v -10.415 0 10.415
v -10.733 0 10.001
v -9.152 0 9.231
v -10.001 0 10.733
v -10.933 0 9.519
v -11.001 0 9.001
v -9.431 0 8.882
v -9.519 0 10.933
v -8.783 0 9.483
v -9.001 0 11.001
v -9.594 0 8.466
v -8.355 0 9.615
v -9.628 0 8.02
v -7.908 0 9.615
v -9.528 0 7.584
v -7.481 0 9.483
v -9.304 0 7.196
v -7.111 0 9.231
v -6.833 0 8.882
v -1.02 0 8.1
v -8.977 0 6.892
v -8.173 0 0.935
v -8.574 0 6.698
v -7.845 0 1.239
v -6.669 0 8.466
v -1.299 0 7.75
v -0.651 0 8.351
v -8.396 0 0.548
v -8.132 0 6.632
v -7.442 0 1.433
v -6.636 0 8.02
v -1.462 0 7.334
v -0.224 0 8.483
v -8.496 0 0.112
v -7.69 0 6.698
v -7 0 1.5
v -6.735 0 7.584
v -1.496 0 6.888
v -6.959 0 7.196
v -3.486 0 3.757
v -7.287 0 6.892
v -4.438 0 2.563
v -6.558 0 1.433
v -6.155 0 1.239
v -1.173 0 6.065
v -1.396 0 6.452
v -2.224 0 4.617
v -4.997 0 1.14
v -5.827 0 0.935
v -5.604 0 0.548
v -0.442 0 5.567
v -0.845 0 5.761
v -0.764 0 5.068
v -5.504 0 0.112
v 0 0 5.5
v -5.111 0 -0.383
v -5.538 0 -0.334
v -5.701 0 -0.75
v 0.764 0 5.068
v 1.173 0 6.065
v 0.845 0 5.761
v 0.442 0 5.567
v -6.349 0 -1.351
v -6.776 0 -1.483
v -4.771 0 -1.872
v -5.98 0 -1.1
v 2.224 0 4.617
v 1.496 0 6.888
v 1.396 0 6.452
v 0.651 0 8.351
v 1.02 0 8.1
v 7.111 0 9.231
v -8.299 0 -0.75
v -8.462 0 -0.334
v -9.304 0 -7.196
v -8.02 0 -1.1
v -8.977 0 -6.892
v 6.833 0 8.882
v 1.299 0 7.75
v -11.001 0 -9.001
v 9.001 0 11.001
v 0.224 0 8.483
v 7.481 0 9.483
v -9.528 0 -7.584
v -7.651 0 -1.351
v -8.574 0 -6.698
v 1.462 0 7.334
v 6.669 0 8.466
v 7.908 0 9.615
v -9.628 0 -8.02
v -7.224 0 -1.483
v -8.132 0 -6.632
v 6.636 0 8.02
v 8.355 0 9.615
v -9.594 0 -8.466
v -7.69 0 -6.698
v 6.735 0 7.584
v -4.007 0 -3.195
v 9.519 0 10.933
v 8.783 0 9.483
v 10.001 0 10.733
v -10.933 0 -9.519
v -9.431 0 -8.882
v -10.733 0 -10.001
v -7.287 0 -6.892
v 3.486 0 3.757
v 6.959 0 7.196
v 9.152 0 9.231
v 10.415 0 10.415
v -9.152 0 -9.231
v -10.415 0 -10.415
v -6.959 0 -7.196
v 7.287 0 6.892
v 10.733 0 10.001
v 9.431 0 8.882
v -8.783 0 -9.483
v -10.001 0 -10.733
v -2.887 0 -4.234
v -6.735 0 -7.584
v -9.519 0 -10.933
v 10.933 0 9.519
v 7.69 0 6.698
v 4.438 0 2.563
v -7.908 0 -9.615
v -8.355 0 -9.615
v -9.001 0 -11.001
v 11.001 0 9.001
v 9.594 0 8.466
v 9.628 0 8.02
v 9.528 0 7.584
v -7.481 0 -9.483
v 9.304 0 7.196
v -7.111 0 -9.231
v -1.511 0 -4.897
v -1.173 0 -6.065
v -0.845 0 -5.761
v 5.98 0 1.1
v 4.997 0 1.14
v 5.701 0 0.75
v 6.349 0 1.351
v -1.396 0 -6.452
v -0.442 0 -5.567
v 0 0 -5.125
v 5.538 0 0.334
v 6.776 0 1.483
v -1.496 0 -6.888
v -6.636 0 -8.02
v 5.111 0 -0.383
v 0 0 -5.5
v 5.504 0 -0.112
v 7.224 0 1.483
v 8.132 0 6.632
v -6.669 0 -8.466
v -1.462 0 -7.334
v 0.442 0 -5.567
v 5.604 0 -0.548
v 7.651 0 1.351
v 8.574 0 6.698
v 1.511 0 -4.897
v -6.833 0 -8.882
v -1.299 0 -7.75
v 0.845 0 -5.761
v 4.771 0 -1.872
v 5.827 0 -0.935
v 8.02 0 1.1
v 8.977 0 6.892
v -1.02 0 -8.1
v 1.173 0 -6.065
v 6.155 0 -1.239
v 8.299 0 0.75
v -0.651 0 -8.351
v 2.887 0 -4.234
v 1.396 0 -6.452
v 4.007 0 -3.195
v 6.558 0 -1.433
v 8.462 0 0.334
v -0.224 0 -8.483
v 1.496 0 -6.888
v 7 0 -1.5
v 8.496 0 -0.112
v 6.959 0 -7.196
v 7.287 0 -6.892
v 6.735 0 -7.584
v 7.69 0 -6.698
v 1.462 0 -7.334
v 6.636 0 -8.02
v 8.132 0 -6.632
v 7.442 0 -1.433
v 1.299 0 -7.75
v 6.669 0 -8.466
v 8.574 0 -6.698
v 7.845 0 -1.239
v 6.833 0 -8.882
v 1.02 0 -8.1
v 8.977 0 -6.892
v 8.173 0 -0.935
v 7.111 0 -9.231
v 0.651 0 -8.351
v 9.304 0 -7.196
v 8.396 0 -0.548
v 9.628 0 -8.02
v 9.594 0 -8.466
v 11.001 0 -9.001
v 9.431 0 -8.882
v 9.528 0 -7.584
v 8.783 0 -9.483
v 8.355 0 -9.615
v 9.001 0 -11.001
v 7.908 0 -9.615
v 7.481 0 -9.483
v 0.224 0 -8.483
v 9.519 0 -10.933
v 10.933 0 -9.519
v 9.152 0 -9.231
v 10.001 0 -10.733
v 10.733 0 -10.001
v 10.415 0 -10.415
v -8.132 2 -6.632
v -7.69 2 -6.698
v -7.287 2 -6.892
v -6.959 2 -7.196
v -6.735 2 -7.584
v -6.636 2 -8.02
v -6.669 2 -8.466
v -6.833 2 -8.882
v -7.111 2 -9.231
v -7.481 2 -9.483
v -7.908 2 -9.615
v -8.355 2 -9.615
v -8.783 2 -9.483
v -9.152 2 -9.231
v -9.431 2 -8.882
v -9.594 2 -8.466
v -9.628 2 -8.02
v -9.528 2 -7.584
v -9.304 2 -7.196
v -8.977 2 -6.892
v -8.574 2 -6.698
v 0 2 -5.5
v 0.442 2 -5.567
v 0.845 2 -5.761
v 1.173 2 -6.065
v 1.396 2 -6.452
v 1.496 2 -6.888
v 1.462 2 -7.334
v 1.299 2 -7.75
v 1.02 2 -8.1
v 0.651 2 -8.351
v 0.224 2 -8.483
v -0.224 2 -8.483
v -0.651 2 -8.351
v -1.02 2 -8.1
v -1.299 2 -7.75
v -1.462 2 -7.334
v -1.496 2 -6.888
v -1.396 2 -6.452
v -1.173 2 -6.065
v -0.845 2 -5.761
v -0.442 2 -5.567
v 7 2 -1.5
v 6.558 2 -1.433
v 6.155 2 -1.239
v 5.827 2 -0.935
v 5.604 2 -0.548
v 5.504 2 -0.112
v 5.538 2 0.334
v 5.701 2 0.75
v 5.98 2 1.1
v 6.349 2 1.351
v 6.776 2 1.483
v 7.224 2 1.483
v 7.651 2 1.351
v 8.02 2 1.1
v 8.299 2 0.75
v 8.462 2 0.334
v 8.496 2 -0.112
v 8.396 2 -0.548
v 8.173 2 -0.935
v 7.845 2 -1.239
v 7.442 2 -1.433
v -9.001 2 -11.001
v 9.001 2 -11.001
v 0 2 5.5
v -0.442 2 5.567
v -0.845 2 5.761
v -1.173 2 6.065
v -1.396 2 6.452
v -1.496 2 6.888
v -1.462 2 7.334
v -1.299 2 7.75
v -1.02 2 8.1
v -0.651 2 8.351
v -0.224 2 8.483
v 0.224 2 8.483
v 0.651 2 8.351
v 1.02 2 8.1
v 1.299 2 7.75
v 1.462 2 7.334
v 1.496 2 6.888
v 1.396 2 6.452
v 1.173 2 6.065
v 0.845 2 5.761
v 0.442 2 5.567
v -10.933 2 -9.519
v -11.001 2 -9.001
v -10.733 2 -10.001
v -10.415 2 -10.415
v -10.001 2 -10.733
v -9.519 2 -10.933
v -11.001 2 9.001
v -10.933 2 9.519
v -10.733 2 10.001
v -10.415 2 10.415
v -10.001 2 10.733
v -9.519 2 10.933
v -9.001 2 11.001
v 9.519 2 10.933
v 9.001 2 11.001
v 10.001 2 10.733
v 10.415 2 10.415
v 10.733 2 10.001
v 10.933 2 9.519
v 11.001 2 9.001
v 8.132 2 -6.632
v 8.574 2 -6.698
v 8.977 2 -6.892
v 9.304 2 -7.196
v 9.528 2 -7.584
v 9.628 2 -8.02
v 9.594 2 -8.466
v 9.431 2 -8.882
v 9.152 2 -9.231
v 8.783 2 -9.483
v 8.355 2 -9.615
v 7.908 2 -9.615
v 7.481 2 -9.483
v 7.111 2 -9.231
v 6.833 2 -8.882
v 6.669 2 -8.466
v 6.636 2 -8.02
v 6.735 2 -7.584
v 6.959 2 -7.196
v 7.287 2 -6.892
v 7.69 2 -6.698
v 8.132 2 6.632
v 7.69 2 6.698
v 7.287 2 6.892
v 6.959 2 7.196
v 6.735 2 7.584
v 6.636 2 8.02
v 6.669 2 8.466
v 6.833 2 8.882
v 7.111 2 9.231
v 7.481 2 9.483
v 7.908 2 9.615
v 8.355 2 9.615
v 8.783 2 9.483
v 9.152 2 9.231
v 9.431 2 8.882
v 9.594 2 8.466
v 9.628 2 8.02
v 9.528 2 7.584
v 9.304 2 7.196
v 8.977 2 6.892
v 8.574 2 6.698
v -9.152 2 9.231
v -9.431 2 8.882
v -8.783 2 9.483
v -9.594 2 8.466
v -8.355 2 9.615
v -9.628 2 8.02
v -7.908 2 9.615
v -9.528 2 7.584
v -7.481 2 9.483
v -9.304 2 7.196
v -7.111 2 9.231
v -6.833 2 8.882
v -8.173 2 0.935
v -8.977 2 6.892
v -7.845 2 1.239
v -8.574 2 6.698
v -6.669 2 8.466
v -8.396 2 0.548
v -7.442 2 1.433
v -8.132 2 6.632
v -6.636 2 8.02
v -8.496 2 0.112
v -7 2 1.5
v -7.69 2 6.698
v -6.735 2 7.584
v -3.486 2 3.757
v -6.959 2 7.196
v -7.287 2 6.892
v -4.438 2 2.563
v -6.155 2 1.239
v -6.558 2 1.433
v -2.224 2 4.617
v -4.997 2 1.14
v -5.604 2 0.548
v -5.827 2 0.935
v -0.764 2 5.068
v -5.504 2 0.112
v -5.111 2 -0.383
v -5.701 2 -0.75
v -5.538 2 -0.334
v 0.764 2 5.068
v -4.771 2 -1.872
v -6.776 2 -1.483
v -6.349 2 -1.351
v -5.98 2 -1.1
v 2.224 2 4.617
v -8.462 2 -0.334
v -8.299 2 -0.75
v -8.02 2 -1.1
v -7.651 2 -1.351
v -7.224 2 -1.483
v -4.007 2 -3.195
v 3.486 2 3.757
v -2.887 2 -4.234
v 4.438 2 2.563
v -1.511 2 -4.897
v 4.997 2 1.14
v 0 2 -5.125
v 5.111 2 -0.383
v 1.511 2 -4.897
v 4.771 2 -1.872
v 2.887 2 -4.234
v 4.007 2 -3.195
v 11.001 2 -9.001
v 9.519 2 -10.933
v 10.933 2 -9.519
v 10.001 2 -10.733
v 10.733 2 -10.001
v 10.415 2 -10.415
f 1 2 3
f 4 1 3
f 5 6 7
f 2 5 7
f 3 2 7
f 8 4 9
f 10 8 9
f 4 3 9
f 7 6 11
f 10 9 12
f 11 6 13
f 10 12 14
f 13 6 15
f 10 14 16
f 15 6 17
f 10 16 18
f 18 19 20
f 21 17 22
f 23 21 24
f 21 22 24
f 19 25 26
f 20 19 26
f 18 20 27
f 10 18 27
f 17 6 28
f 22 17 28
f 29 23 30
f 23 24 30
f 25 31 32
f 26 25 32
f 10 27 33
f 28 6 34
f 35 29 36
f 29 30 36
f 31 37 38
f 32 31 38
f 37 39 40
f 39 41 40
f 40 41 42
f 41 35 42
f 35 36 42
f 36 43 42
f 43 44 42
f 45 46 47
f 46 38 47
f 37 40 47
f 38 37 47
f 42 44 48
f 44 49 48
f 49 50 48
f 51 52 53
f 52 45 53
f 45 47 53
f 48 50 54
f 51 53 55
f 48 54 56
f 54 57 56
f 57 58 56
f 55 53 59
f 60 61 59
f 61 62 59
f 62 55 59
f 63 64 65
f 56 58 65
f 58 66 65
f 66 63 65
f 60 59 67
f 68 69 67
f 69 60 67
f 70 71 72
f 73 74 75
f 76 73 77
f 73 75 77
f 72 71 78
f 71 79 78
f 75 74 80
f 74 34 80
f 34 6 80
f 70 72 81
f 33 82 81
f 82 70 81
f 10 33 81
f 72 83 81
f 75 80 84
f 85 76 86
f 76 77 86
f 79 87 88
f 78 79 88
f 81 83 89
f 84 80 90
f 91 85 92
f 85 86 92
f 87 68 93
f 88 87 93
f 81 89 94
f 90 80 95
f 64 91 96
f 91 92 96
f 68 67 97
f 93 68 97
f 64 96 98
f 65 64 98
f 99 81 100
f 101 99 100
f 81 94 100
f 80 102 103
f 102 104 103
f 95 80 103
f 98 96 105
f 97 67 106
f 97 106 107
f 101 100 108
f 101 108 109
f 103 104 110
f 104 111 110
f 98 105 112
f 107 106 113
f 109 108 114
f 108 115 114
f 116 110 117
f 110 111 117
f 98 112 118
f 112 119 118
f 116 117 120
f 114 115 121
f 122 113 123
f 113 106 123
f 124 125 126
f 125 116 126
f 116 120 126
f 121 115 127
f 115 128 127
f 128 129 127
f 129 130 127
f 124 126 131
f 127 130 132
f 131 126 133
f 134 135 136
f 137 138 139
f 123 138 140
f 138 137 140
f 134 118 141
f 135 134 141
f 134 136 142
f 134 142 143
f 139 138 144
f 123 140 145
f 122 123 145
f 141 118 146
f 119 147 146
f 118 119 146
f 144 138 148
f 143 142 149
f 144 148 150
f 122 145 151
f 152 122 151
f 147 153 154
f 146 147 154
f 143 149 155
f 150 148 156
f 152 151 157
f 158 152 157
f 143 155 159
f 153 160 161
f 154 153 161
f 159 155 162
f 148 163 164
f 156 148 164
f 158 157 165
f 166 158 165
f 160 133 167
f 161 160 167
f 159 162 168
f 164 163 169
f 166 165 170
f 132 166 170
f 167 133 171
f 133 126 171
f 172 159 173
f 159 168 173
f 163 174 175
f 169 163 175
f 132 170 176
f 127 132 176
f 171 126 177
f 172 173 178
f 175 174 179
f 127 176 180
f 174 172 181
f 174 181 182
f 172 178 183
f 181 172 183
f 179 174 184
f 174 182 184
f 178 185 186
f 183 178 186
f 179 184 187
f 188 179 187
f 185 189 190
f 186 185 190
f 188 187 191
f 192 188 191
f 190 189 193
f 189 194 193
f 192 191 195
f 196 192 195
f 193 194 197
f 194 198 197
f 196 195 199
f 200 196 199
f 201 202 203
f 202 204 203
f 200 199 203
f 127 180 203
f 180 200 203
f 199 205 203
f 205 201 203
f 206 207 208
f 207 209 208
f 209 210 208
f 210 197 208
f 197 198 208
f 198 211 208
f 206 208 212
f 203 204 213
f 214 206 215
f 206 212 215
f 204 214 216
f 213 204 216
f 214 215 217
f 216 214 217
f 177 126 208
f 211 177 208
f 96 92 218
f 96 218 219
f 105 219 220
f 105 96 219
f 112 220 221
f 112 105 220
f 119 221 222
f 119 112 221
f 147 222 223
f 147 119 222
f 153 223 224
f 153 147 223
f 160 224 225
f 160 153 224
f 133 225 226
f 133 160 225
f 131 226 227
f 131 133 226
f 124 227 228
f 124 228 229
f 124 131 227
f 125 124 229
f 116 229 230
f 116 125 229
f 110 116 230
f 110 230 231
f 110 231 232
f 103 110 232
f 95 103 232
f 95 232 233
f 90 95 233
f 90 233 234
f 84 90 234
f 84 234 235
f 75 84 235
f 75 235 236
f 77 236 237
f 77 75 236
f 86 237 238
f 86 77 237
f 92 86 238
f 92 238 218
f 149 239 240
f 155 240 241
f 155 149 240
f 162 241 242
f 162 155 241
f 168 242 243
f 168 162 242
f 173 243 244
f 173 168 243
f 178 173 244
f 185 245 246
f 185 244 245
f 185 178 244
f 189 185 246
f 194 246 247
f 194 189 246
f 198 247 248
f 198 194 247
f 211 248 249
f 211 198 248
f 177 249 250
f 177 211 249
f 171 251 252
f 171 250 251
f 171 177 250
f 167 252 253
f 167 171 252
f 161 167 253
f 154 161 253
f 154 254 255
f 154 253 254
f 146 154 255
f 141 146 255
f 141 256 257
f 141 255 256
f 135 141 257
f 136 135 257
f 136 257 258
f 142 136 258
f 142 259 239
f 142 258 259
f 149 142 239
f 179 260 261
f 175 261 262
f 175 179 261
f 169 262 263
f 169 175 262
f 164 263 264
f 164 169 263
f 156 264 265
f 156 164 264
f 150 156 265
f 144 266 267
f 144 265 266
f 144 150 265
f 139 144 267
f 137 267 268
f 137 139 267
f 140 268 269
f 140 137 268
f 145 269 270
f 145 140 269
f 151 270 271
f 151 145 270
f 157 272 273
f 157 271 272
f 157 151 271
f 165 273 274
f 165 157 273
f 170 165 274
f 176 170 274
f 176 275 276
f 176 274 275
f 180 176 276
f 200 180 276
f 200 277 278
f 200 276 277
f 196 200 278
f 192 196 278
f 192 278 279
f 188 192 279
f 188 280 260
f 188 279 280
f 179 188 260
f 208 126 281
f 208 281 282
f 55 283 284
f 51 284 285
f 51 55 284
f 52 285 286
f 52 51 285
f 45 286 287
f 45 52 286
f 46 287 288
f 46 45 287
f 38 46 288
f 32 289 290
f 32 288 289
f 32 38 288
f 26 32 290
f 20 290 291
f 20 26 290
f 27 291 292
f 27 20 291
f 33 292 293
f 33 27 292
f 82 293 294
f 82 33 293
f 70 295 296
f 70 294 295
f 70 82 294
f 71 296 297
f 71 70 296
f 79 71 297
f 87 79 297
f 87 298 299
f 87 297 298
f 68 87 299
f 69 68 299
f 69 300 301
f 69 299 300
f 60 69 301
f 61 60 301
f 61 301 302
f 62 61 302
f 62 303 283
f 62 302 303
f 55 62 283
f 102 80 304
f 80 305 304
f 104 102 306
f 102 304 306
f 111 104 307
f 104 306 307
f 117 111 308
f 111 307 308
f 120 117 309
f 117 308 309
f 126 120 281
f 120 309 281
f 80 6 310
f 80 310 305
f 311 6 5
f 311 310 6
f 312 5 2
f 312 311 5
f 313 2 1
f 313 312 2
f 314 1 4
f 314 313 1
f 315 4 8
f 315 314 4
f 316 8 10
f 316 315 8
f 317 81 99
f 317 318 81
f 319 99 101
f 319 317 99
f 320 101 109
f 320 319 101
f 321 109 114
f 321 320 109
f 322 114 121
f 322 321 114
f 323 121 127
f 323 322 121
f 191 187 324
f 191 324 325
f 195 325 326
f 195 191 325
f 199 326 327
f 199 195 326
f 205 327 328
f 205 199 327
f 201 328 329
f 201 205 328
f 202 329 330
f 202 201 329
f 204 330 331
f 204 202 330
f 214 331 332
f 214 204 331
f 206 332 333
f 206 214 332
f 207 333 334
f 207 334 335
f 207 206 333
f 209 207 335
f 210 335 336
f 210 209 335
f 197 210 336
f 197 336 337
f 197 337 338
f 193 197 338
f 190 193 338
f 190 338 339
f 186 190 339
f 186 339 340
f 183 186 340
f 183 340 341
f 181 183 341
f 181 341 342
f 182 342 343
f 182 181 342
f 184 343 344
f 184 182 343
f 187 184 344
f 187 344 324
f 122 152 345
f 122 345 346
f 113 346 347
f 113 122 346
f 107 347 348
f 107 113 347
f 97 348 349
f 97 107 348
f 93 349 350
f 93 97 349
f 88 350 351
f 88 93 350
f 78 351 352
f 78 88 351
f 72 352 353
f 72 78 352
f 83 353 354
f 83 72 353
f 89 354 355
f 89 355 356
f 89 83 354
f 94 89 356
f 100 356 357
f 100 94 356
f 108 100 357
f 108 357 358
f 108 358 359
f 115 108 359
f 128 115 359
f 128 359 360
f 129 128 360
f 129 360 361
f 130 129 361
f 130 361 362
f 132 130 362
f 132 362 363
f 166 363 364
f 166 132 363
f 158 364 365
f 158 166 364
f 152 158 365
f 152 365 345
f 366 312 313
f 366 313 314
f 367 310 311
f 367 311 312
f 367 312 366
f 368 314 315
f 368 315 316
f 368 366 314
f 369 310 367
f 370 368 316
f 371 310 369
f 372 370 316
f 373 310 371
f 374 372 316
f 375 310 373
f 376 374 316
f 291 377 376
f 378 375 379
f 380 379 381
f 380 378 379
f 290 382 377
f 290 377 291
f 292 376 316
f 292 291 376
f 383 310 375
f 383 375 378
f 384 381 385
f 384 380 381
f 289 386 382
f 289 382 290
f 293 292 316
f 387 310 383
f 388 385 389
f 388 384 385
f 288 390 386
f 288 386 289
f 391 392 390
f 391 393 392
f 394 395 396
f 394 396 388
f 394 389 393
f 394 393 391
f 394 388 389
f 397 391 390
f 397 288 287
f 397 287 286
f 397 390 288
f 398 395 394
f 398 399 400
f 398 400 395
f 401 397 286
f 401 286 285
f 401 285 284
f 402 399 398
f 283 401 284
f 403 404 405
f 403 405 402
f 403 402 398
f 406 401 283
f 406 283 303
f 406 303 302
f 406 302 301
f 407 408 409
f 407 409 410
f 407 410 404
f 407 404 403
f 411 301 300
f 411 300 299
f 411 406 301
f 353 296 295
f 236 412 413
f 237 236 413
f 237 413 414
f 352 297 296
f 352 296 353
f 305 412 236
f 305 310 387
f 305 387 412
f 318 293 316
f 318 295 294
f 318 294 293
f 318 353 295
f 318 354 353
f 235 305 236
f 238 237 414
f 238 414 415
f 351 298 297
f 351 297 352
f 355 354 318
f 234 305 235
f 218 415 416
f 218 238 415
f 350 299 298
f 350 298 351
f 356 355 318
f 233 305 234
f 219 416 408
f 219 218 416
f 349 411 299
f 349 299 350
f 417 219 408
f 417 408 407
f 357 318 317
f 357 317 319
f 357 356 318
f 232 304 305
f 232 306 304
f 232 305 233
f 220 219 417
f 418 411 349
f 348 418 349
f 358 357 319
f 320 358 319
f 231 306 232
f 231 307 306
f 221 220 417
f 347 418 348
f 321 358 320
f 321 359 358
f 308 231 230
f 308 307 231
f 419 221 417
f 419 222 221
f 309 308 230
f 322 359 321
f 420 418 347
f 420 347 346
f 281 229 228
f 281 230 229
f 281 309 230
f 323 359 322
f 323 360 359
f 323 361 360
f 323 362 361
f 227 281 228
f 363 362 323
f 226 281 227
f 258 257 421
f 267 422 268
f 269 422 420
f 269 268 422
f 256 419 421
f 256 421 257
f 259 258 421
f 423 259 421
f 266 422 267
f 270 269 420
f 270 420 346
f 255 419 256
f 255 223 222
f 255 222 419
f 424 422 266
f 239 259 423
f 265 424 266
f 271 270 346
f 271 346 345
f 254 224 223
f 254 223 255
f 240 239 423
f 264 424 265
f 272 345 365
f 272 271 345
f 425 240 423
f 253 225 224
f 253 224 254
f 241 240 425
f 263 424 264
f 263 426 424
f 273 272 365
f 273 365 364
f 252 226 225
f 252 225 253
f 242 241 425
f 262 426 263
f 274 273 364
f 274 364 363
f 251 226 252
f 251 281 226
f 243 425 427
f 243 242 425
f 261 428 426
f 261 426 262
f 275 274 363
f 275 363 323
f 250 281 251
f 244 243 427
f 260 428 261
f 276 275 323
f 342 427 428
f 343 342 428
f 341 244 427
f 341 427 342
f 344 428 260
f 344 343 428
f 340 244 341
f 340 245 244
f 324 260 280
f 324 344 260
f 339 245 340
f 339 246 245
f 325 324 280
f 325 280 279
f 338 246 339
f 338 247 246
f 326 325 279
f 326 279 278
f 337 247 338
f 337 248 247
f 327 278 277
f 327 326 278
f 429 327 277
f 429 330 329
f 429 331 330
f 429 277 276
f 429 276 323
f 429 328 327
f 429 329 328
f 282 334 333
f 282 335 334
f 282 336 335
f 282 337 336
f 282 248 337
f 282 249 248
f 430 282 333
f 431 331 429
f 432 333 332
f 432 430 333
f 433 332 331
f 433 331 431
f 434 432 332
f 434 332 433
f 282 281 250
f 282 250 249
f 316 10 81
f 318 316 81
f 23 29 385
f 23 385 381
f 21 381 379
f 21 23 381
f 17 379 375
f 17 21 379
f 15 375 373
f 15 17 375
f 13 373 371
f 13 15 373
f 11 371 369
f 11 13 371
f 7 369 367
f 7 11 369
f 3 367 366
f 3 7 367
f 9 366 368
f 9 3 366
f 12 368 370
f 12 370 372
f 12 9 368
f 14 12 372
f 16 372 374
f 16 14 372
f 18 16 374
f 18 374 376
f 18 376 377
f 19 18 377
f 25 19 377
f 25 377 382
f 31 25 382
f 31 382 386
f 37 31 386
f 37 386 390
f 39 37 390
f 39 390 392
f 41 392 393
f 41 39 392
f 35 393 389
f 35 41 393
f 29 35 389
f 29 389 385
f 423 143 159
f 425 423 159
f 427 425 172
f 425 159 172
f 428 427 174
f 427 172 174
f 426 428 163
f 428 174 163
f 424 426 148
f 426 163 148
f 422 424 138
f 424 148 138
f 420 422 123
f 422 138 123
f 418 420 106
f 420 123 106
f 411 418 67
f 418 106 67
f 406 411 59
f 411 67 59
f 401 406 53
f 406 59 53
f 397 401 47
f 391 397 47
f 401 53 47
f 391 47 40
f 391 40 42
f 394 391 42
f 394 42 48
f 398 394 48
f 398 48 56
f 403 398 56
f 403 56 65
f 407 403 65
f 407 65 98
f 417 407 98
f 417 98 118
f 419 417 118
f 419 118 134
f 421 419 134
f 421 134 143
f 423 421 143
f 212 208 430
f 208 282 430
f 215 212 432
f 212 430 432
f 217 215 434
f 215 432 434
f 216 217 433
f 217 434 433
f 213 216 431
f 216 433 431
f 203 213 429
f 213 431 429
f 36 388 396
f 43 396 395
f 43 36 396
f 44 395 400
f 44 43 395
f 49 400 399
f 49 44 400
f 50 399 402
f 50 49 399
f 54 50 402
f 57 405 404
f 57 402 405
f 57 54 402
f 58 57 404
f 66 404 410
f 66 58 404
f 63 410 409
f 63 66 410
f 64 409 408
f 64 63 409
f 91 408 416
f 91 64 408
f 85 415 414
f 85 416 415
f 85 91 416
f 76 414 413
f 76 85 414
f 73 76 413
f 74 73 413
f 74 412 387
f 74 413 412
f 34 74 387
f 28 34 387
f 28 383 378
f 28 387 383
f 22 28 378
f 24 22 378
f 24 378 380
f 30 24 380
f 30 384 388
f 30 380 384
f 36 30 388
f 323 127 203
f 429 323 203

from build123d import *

# Parameters (mm, degrees)
SKETCH_1_W          = 22.002454374
SKETCH_1_H          = 22.002454374
SKETCH_1_R          = 1.5
EXTRUDE_1_DEPTH     = 2
FILLET_1_R          = 2
SKETCH_3_R          = 1.5
CUT_EXTRUDE_2_DEPTH = 10
SKETCH_4_R          = 5.125
CUT_EXTRUDE_3_DEPTH = 10


with BuildPart() as part:
    # 草图1 → 凸台-拉伸1 (new body)
    with BuildSketch(Plane(origin=(0, 0, 0), x_dir=(1, 0, 0), z_dir=(0, 1, 0))):
        Rectangle(SKETCH_1_W, SKETCH_1_H)
        with Locations(Location((-8.131727984, 8.131727984, 0), (0, 0, 270))):
            Circle(SKETCH_1_R, mode=Mode.SUBTRACT)
        with Locations(Location((8.131727984, -8.131727984, 0), (0, 0, 90))):
            Circle(SKETCH_1_R, mode=Mode.SUBTRACT)
        with Locations(Location((8.131727984, 8.131727984, 0), (0, 0, 270))):
            Circle(SKETCH_1_R, mode=Mode.SUBTRACT)
        with Locations(Location((-8.131727984, -8.131727984, 0), (0, 0, 90))):
            Circle(SKETCH_1_R, mode=Mode.SUBTRACT)
    extrude(amount=EXTRUDE_1_DEPTH)

    # 圆角1
    fillet_1_edges = [part.edges().sort_by_distance(p)[0] for p in [
        (11.001227187, 1, 11.001227187),
        (-11.001227187, 1, 11.001227187),
        (-11.001227187, 1, -11.001227187),
        (11.001227187, 1, -11.001227187),
    ]]
    fillet(fillet_1_edges, radius=FILLET_1_R)

    # 草图3 → 切除-拉伸2 (cut)
    with BuildSketch(Plane(origin=(0, 0, 0), x_dir=(1, 0, 0), z_dir=(0, 1, 0))):
        with Locations(Location((-7, 0, 0), (0, 0, 270))):
            Circle(SKETCH_3_R)
        with Locations(Location((7, 0, 0), (0, 0, 90))):
            Circle(SKETCH_3_R)
        with Locations(Location((0, 7, 0), (0, 0, 270))):
            Circle(SKETCH_3_R)
        with Locations(Location((0, -7, 0), (0, 0, 90))):
            Circle(SKETCH_3_R)
    extrude(amount=CUT_EXTRUDE_2_DEPTH, mode=Mode.SUBTRACT)

    # 草图4 → 切除-拉伸3 (cut)
    with BuildSketch(Plane.XZ):
        with Locations(Location((0, 0, 0), (0, 0, 270))):
            Circle(SKETCH_4_R)
    extrude(amount=-CUT_EXTRUDE_3_DEPTH, mode=Mode.SUBTRACT)


solid = part.part
